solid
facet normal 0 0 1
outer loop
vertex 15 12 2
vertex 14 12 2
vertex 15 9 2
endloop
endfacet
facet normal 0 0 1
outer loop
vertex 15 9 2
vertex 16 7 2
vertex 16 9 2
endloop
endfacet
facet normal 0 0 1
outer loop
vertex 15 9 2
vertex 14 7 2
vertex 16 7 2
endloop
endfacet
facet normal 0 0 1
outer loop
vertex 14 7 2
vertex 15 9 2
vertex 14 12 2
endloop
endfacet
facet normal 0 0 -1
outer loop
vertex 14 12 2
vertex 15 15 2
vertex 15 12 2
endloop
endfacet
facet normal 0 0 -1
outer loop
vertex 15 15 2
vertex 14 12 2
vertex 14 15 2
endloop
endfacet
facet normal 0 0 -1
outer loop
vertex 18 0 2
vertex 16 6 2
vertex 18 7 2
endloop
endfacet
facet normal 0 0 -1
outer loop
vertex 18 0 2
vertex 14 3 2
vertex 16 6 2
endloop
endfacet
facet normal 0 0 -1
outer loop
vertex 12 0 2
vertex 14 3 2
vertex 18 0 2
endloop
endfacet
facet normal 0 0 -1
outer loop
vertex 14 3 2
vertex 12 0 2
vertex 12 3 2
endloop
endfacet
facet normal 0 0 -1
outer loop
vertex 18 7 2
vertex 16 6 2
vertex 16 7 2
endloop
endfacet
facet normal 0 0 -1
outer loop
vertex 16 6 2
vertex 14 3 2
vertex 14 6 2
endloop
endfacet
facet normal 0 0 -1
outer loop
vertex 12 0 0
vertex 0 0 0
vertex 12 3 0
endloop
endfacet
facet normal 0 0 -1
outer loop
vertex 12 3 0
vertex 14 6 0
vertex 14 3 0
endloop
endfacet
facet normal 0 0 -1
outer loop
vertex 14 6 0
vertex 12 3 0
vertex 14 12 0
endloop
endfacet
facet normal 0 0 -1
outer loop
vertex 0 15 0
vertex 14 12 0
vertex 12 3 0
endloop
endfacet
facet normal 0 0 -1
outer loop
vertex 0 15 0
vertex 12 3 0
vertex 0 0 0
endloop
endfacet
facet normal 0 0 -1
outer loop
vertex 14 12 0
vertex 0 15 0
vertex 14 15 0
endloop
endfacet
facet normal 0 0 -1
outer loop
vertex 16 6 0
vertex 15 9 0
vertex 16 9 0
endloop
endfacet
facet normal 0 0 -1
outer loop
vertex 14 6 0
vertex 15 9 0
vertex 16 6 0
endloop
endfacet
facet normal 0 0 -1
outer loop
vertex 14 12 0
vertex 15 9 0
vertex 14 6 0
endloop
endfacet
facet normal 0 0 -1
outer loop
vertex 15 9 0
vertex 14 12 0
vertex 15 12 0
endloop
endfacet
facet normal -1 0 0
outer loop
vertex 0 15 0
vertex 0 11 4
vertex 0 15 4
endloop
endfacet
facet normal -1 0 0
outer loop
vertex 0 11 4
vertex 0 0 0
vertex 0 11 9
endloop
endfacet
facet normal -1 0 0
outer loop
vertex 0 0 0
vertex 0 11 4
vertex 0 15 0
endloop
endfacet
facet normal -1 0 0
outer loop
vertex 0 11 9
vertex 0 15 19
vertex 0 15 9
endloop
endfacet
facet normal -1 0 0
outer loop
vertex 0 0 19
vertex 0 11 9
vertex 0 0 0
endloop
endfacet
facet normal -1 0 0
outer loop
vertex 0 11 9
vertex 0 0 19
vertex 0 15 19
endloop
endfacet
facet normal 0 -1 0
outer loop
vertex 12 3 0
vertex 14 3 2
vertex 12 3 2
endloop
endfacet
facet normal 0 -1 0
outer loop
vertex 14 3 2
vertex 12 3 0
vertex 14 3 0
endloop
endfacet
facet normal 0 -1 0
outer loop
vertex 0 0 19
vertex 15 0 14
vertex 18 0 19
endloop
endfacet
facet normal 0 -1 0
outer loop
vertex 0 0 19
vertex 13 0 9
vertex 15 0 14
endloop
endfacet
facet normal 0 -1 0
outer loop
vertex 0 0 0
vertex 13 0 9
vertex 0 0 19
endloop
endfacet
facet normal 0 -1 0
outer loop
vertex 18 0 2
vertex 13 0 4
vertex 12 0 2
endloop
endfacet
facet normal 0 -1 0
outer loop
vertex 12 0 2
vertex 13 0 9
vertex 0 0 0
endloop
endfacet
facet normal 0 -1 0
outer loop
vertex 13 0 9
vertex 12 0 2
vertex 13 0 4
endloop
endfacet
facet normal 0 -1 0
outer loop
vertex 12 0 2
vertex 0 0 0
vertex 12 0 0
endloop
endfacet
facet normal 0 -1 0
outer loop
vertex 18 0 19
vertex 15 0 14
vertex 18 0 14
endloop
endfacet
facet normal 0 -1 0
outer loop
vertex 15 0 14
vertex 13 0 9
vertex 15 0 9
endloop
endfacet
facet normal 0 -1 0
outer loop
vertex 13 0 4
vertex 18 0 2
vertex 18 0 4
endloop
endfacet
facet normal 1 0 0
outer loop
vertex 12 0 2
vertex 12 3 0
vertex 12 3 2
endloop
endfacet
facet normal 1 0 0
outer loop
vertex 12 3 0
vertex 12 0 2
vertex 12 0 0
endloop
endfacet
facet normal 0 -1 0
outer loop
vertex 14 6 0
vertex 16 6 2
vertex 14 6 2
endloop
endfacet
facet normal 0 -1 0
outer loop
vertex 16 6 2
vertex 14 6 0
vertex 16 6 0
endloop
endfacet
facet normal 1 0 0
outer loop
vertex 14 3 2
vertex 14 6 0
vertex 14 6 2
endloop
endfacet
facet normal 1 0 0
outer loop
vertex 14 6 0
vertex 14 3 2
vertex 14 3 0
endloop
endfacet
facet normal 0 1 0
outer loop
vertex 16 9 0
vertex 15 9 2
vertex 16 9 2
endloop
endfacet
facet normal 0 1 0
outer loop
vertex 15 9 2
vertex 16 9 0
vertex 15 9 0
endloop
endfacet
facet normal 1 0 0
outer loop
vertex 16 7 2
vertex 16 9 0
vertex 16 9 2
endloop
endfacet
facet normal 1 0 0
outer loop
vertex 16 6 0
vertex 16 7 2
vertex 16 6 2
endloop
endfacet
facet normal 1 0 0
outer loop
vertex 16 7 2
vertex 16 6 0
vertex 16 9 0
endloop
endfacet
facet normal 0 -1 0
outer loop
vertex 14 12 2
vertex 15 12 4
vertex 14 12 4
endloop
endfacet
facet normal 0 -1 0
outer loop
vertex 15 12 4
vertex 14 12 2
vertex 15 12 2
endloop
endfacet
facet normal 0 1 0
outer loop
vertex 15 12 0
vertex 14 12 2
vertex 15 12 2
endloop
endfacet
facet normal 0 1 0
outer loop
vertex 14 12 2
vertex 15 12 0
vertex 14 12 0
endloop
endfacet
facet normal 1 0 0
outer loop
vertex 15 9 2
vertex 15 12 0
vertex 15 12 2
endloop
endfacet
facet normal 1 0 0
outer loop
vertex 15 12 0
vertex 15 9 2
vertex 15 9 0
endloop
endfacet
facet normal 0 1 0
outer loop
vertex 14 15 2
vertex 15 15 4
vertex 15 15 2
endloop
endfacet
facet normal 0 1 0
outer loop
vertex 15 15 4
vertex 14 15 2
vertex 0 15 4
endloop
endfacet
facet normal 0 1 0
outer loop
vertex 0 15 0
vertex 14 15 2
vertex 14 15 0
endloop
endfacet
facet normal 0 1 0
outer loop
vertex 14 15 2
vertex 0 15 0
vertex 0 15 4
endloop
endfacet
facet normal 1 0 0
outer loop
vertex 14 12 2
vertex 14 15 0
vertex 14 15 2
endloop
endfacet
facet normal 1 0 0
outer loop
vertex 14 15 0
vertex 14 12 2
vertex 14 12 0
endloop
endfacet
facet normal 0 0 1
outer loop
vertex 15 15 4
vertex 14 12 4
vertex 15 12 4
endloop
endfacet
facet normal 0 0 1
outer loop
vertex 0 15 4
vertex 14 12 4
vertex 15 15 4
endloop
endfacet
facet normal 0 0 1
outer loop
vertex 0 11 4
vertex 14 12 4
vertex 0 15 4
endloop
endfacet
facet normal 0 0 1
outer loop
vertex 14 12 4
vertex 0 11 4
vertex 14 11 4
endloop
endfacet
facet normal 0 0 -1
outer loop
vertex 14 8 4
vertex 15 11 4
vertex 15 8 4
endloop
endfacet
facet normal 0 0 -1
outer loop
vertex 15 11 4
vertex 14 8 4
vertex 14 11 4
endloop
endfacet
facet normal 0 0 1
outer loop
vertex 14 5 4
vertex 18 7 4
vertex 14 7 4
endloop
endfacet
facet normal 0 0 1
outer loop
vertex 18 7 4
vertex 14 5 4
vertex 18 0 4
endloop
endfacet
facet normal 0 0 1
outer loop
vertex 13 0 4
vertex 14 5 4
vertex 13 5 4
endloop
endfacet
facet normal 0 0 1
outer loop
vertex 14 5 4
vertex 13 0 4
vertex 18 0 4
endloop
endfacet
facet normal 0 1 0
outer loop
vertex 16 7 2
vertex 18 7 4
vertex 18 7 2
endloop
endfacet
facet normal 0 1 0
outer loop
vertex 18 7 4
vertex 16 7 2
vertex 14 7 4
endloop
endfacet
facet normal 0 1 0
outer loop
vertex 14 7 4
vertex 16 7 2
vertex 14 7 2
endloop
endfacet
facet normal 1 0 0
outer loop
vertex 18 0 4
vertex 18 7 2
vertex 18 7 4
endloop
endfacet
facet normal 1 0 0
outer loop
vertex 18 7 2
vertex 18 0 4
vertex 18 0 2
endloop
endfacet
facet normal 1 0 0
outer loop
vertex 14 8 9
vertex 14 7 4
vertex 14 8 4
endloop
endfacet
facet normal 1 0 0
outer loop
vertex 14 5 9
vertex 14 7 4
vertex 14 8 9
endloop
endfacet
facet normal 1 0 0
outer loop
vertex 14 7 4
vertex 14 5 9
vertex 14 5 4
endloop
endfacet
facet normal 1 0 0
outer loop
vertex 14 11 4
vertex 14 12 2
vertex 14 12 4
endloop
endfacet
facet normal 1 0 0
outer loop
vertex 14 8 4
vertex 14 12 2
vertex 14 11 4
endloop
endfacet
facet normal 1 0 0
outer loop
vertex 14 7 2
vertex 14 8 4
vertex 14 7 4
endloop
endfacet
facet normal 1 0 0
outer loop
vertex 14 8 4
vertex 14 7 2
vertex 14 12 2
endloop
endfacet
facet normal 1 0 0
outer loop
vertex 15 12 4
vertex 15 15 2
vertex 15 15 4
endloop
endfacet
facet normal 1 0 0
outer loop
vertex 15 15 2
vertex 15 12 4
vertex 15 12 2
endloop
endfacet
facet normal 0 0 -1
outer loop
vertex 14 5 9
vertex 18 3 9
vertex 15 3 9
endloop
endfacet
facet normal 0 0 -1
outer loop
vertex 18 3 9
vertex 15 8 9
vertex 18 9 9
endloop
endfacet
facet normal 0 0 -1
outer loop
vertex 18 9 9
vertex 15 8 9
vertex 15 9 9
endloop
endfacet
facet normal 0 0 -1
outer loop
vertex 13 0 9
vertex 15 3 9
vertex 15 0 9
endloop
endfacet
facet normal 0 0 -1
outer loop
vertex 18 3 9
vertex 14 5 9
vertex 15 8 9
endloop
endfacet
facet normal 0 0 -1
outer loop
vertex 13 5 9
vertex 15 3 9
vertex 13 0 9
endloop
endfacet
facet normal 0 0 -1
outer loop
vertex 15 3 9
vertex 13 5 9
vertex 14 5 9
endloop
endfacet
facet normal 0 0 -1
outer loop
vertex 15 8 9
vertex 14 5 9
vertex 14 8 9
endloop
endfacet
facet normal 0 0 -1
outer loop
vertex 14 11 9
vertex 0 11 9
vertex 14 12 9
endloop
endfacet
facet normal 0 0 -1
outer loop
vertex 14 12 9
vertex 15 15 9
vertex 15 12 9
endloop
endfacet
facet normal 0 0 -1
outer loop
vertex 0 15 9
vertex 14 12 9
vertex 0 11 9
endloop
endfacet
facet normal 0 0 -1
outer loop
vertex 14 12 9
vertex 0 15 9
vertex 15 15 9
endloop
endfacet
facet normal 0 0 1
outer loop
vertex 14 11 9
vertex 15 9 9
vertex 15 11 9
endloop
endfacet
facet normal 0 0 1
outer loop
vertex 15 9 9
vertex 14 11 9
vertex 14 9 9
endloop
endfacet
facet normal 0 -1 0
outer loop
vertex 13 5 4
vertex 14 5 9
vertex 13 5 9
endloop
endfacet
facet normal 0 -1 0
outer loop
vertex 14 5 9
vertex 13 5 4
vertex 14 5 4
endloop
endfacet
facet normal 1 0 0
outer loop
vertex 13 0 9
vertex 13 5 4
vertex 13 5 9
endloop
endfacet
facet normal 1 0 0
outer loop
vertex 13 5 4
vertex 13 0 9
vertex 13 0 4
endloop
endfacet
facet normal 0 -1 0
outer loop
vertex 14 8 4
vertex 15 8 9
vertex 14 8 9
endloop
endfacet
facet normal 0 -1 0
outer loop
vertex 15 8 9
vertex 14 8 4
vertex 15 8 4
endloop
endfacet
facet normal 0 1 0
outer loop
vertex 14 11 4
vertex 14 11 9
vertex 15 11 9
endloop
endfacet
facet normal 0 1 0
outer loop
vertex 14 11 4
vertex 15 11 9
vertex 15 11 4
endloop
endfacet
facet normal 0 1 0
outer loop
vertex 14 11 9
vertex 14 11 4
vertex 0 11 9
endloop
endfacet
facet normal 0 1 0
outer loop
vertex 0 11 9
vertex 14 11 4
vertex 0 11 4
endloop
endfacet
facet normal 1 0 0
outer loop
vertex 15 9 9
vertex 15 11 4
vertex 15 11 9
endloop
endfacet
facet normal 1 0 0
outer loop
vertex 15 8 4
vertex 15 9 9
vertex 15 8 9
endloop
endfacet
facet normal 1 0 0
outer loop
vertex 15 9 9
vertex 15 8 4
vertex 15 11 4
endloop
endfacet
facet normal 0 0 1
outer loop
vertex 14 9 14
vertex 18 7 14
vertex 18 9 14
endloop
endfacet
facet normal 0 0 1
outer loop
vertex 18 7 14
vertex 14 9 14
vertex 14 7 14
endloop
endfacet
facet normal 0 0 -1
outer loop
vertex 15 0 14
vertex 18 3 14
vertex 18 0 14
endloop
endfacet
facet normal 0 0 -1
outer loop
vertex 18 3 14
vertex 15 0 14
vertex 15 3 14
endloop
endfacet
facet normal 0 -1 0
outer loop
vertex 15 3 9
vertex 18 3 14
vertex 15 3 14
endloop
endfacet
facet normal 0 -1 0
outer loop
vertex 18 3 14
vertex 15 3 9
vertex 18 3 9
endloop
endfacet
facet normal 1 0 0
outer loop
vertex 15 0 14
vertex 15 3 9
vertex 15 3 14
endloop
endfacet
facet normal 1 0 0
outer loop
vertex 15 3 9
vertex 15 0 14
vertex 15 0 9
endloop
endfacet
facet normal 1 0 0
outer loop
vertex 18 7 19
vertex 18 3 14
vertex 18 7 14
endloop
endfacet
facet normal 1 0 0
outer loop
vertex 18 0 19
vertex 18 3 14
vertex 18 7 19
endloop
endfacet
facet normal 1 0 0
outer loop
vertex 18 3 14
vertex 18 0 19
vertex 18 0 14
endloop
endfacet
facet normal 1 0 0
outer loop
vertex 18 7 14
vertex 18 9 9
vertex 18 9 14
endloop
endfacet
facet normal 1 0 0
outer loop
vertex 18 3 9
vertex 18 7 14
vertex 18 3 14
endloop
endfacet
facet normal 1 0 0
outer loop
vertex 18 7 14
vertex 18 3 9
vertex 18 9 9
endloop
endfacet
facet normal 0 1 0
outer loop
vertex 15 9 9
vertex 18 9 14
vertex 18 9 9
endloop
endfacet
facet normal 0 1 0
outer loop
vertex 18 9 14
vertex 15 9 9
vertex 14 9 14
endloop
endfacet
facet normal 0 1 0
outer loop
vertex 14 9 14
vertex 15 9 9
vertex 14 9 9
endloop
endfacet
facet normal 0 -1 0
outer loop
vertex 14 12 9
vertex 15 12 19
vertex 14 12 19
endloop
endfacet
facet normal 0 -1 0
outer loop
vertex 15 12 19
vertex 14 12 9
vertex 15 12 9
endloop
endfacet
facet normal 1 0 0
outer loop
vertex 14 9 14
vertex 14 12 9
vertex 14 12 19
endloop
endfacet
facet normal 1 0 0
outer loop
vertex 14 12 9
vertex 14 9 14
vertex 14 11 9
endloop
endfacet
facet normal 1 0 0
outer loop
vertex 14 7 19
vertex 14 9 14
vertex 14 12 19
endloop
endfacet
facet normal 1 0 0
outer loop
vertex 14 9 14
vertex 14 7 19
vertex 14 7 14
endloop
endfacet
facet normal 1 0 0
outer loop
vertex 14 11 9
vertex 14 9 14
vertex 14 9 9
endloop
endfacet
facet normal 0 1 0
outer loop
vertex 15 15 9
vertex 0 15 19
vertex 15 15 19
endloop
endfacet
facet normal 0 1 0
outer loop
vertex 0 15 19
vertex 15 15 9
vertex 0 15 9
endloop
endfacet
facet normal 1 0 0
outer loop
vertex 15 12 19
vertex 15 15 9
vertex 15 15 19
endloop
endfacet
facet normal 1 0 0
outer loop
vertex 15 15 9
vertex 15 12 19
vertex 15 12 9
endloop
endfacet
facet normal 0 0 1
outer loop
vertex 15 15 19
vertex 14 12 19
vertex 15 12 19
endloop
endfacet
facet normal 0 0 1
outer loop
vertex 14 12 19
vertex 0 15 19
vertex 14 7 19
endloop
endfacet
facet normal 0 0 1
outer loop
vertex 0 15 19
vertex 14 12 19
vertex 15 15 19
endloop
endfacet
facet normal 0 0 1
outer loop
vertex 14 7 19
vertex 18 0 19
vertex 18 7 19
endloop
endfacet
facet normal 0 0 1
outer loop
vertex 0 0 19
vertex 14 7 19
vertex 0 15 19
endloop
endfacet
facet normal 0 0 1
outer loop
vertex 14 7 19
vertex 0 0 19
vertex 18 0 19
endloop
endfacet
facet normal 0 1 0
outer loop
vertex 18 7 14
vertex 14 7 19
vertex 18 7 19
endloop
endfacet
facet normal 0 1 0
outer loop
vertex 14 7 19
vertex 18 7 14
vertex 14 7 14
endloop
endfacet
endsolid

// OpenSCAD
translate([2.5, 1.5, 1.0]) color([0.5241618701522923, 0.12922303534199353, 0.91039239754397]) cube([5, 3, 2], center=true);
translate([8.5, 1.5, 1.0]) color([0.4441243361619651, 0.7893377392253591, 0.38887513002224416]) cube([7, 3, 2], center=true);
translate([3.5, 4.5, 1.0]) color([0.806846018820692, 0.3895364160074527, 0.2201595216660458]) cube([7, 3, 2], center=true);
translate([10.5, 4.5, 1.0]) color([0.19619466691666865, 0.9400346443375104, 0.58653025858102]) cube([7, 3, 2], center=true);
translate([5.5, 7.5, 1.0]) color([0.04979326505826487, 0.38834759617804915, 0.234029260524927]) cube([11, 3, 2], center=true);
translate([13.5, 7.5, 1.0]) color([0.08465706460929934, 0.18675586852140846, 0.05699047999950346]) cube([5, 3, 2], center=true);
translate([2.5, 10.5, 1.0]) color([0.6380736282281027, 0.17337386483746886, 0.6107798762435255]) cube([5, 3, 2], center=true);
translate([7.5, 10.5, 1.0]) color([0.6125067478912297, 0.7049237107399368, 0.5121186506114312]) cube([5, 3, 2], center=true);
translate([12.5, 10.5, 1.0]) color([0.28442399033479826, 0.8774574539285279, 0.35307108172351365]) cube([5, 3, 2], center=true);
translate([3.5, 13.5, 1.0]) color([0.4582943249787391, 0.6318794317305464, 0.5161242981674495]) cube([7, 3, 2], center=true);
translate([10.5, 13.5, 1.0]) color([0.9564683485665337, 0.9547176774381221, 0.9297598506094263]) cube([7, 3, 2], center=true);
translate([5.5, 3.5, 3.0]) color([0.9340763496652581, 0.580960135568696, 0.49020206373000297]) cube([11, 7, 2], center=true);
translate([14.5, 3.5, 3.0]) color([0.7041168173823689, 0.21541959298546798, 0.26587203921552827]) cube([7, 7, 2], center=true);
translate([3.5, 9.5, 3.0]) color([0.04380725363309168, 0.16285754255803098, 0.0038745499388105342]) cube([7, 5, 2], center=true);
translate([10.5, 9.5, 3.0]) color([0.6546275765234981, 0.14040698903568194, 0.7866793455760521]) cube([7, 5, 2], center=true);
translate([2.5, 13.5, 3.0]) color([0.680503995881725, 0.9706757933544957, 0.3965144869518913]) cube([5, 3, 2], center=true);
translate([7.5, 13.5, 3.0]) color([0.9213919134510528, 0.4537041723195332, 0.3395037398362071]) cube([5, 3, 2], center=true);
translate([12.5, 13.5, 3.0]) color([0.10233886991705377, 0.8828321850718597, 0.7947901585625868]) cube([5, 3, 2], center=true);
translate([3.0, 2.5, 6.5]) color([0.3229289765350606, 0.45574438492562896, 0.32514346581324827]) cube([6, 5, 5], center=true);
translate([9.5, 2.5, 6.5]) color([0.028829116538094723, 0.04435252539911694, 0.3687041258820589]) cube([7, 5, 5], center=true);
translate([3.5, 6.5, 6.5]) color([0.20959132812878367, 0.5245146032105923, 0.1877850356496189]) cube([7, 3, 5], center=true);
translate([10.5, 6.5, 6.5]) color([0.2016215864664097, 0.6726678813176303, 0.7356026567617159]) cube([7, 3, 5], center=true);
translate([2.5, 9.5, 6.5]) color([0.31223209587410494, 0.8599943994333726, 0.2546391746557106]) cube([5, 3, 5], center=true);
translate([7.5, 9.5, 6.5]) color([0.34394037628155716, 0.712480390369609, 0.04450290132920964]) cube([5, 3, 5], center=true);
translate([12.5, 9.5, 6.5]) color([0.934183460116191, 0.07233773178762537, 0.4609310589380602]) cube([5, 3, 5], center=true);
translate([4.0, 1.5, 11.5]) color([0.7246048259600892, 0.04746853498479808, 0.8090026856371774]) cube([8, 3, 5], center=true);
translate([11.5, 1.5, 11.5]) color([0.9788933433114139, 0.460511672795628, 0.11812363628756806]) cube([7, 3, 5], center=true);
translate([5.5, 4.5, 11.5]) color([0.08147699565547994, 0.09873043616313526, 0.7654413741364753]) cube([11, 3, 5], center=true);
translate([14.5, 4.5, 11.5]) color([0.4140128484685186, 0.9192341581990311, 0.4406397760864845]) cube([7, 3, 5], center=true);
translate([4.5, 7.5, 11.5]) color([0.07714331014460807, 0.42693558751800065, 0.7548278934255565]) cube([9, 3, 5], center=true);
translate([13.5, 7.5, 11.5]) color([0.8293384268467949, 0.039351686529191854, 0.1803893912563338]) cube([9, 3, 5], center=true);
translate([3.5, 10.5, 11.5]) color([0.490013452023644, 0.12808547795160863, 0.8710926419421733]) cube([7, 3, 5], center=true);
translate([10.5, 10.5, 11.5]) color([0.9344608884461488, 0.3195969983538176, 0.43484368255202]) cube([7, 3, 5], center=true);
translate([2.5, 13.5, 11.5]) color([0.5570540644200566, 0.2855057910835891, 0.5410756974595614]) cube([5, 3, 5], center=true);
translate([7.5, 13.5, 11.5]) color([0.2011850454737838, 0.2966412512769129, 0.44178363318767744]) cube([5, 3, 5], center=true);
translate([12.5, 13.5, 11.5]) color([0.604669902191143, 0.5361650260862432, 0.2609879767339395]) cube([5, 3, 5], center=true);
translate([5.5, 3.5, 16.5]) color([0.23178787541805523, 0.11873023670071103, 0.7834936358921726]) cube([11, 7, 5], center=true);
translate([14.5, 3.5, 16.5]) color([0.09890076646638046, 0.7328850061793606, 0.2487736956630997]) cube([7, 7, 5], center=true);
translate([3.5, 9.5, 16.5]) color([0.28455698400578255, 0.7360834330107994, 0.6596207917216363]) cube([7, 5, 5], center=true);
translate([10.5, 9.5, 16.5]) color([0.7419215555155583, 0.5152830587943614, 0.8590958196652707]) cube([7, 5, 5], center=true);
translate([2.5, 13.5, 16.5]) color([0.12179389137547159, 0.6451969614065052, 0.11824431248865597]) cube([5, 3, 5], center=true);
translate([7.5, 13.5, 16.5]) color([0.7372833681454282, 0.3589046614584527, 0.67488210437111]) cube([5, 3, 5], center=true);
translate([12.5, 13.5, 16.5]) color([0.7034839134412817, 0.6606084576410584, 0.22155798032782648]) cube([5, 3, 5], center=true);
